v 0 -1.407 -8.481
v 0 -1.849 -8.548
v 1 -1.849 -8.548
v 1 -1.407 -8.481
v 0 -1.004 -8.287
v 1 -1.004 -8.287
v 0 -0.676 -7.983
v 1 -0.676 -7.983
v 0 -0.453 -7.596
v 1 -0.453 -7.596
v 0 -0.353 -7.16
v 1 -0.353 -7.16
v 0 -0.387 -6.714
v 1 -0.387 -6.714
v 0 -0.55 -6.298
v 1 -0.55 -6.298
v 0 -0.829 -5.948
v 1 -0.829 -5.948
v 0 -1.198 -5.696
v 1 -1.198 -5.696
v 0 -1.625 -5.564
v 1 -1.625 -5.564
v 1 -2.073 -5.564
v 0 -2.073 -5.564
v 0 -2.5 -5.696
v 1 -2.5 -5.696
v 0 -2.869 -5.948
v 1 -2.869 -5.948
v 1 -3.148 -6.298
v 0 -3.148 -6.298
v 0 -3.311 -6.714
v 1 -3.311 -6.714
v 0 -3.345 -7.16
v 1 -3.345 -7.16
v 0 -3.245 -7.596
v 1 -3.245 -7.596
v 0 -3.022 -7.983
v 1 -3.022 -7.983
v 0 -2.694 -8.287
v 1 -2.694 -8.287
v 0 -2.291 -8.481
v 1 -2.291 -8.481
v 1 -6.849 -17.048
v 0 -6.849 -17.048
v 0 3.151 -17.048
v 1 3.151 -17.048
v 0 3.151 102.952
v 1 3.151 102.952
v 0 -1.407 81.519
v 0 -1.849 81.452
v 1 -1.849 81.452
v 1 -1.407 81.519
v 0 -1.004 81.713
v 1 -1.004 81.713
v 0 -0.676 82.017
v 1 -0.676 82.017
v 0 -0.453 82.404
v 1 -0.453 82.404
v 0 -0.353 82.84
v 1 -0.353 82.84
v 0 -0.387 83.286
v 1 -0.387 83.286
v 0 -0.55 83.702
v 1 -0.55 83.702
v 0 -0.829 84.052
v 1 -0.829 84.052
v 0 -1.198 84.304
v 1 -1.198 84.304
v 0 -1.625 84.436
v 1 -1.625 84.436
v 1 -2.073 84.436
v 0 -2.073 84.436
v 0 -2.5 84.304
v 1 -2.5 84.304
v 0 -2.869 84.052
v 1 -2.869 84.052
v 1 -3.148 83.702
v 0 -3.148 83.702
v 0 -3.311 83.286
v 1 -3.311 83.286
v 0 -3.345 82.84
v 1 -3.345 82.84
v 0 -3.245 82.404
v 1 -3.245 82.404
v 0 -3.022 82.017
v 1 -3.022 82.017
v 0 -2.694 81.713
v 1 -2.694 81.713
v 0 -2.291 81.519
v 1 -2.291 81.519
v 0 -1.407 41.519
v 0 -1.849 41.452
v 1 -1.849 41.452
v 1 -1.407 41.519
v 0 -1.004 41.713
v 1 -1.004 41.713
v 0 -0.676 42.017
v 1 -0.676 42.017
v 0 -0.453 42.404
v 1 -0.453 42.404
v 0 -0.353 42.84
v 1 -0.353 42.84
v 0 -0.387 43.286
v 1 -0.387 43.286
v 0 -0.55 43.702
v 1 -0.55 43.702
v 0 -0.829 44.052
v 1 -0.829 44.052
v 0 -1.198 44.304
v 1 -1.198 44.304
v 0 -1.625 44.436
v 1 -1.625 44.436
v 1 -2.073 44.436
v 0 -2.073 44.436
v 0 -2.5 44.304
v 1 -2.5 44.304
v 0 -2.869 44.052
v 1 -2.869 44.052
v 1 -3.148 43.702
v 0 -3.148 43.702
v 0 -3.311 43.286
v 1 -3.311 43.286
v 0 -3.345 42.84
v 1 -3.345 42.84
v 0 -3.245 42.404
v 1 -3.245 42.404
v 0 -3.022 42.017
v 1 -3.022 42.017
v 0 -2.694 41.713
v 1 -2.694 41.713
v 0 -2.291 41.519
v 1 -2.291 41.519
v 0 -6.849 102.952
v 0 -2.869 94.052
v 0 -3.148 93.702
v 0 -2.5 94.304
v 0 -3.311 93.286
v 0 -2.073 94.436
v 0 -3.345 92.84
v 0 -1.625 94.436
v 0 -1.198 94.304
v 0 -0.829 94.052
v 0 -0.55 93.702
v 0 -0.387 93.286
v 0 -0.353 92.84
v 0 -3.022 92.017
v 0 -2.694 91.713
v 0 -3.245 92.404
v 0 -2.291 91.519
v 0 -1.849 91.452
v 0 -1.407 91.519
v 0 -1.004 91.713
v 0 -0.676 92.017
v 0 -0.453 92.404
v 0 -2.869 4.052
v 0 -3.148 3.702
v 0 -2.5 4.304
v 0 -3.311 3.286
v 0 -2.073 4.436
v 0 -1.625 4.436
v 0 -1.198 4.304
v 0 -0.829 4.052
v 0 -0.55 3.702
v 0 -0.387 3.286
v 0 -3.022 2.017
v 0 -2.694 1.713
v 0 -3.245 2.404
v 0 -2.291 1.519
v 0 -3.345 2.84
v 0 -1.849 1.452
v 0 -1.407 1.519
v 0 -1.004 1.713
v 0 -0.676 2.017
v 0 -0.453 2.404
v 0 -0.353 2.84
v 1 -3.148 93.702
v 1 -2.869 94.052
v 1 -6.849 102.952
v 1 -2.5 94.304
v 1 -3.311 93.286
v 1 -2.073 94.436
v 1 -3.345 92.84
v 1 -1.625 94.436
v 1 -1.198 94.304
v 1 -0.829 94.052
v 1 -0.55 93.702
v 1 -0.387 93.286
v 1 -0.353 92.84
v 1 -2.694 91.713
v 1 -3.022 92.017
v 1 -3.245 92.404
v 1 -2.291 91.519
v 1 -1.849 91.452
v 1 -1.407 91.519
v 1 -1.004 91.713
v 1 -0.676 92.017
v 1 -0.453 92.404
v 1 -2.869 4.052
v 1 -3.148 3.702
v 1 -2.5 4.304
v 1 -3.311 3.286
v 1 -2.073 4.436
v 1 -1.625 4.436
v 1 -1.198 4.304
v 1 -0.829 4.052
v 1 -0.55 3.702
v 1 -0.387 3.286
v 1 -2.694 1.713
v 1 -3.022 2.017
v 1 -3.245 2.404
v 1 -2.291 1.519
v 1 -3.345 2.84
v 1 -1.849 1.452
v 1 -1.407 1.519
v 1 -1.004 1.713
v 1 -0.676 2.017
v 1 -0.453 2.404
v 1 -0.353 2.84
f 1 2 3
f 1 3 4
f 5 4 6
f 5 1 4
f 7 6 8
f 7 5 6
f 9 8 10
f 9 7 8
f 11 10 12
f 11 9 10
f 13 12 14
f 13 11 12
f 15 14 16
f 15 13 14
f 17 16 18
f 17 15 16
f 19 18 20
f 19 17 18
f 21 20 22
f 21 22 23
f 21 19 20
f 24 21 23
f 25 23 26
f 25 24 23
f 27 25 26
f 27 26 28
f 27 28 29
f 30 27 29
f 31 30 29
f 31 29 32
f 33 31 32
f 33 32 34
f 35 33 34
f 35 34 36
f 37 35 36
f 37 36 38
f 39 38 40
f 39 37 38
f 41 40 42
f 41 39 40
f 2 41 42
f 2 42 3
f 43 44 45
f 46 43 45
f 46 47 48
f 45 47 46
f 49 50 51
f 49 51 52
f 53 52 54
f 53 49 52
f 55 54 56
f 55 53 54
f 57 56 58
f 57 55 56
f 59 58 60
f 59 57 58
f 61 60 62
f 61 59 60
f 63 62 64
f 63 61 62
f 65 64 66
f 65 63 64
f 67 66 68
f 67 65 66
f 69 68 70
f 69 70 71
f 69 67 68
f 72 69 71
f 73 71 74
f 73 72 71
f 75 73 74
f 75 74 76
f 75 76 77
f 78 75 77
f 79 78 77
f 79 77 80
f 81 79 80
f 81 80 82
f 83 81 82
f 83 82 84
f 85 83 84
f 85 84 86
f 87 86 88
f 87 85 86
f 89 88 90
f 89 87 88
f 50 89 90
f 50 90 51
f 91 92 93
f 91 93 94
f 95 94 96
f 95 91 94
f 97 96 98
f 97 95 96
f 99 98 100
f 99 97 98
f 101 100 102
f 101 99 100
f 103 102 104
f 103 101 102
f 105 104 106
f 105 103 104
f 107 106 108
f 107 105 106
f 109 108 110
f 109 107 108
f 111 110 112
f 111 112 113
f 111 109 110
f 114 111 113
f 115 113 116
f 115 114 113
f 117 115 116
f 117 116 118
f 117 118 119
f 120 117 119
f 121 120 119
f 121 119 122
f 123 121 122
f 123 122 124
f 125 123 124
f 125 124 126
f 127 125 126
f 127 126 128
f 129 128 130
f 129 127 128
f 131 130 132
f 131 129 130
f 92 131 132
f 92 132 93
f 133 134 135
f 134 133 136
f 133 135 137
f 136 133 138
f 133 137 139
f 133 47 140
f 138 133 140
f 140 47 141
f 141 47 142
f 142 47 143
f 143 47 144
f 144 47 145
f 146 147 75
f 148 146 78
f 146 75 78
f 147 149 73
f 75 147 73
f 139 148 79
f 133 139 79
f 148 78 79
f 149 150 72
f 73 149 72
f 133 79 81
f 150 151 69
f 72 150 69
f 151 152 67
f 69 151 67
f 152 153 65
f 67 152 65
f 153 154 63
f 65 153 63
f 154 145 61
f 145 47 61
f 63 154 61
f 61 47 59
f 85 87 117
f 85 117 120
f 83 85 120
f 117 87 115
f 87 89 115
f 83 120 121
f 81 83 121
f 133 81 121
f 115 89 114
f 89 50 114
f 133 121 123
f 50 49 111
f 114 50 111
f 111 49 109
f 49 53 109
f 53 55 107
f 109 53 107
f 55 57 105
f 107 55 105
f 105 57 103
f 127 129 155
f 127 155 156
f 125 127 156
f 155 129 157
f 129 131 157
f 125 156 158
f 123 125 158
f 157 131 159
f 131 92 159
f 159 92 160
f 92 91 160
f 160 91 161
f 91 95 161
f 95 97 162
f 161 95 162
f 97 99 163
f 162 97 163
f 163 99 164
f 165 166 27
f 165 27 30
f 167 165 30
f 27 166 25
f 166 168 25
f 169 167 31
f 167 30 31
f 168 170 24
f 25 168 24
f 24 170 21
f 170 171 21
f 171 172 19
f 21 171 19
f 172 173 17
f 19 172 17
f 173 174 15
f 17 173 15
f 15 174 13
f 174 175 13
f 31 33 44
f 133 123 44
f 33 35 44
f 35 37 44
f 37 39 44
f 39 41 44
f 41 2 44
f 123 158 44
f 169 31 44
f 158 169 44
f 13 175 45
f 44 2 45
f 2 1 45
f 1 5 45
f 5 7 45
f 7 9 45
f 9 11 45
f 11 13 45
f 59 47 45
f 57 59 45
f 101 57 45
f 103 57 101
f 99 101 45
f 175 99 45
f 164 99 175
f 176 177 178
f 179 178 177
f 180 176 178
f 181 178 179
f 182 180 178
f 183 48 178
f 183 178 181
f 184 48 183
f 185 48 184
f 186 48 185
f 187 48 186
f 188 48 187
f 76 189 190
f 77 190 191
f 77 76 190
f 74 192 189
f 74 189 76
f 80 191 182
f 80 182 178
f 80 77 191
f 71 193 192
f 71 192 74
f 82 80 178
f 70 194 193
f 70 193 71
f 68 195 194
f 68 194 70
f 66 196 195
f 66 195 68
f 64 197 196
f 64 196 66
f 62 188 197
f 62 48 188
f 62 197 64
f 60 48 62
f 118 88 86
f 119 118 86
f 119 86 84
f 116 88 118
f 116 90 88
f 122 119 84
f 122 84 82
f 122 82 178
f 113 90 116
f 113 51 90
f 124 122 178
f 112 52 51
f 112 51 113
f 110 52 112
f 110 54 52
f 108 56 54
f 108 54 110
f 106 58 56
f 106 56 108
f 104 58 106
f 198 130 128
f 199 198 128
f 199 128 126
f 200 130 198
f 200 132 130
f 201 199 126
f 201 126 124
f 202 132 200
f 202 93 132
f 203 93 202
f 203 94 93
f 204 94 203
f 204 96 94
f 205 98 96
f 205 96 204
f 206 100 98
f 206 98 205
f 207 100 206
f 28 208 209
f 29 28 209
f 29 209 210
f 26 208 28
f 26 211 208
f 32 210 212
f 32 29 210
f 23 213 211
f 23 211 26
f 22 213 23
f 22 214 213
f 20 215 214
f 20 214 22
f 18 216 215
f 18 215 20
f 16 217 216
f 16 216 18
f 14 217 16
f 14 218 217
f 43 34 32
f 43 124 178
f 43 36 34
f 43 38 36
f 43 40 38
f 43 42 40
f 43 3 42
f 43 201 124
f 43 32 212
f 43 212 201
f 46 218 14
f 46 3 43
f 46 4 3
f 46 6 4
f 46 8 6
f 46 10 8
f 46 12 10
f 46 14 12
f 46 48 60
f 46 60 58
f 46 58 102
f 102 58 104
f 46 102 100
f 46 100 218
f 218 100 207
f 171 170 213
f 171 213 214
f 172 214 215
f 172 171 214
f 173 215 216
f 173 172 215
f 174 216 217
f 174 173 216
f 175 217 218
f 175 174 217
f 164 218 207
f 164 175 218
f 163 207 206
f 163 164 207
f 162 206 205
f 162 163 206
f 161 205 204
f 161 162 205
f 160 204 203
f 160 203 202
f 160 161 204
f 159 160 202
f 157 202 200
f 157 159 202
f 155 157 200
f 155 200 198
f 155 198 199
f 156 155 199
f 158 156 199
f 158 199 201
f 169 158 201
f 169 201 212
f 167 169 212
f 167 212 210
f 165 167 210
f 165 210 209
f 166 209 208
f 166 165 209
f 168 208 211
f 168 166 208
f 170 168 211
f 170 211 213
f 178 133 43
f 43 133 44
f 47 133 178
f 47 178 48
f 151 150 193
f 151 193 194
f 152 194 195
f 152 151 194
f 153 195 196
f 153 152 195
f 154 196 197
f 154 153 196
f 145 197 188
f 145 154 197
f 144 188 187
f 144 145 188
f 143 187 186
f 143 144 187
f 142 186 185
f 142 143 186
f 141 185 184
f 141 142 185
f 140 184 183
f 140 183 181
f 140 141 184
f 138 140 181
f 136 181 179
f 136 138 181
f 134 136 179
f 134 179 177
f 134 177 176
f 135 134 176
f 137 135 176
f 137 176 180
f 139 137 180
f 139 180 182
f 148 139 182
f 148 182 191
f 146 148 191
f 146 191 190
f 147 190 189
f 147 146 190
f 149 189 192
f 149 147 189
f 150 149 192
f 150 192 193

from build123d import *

# Parameters (mm, degrees)
SKETCH_1_W      = 120
SKETCH_1_H      = 10
SKETCH_1_R      = 1.5
EXTRUDE_1_DEPTH = 1


with BuildPart() as part:
    # 草图1 → 凸台-拉伸1 (new body)
    with BuildSketch(Plane(origin=(0, 0, 0), x_dir=(0, 0, -1), z_dir=(1, 0, 0))):
        with Locations((-42.952312312, -1.848982316)):
            Rectangle(SKETCH_1_W, SKETCH_1_H)
        with Locations((-82.952312312, -1.848982316)):
            Circle(SKETCH_1_R, mode=Mode.SUBTRACT)
        with Locations((-2.952312312, -1.848982316)):
            Circle(SKETCH_1_R, mode=Mode.SUBTRACT)
        with Locations((-92.952312312, -1.848982316)):
            Circle(SKETCH_1_R, mode=Mode.SUBTRACT)
        with Locations((7.047687688, -1.848982316)):
            Circle(SKETCH_1_R, mode=Mode.SUBTRACT)
        with Locations((-42.952312312, -1.848982316)):
            Circle(SKETCH_1_R, mode=Mode.SUBTRACT)
    extrude(amount=EXTRUDE_1_DEPTH)


solid = part.part
